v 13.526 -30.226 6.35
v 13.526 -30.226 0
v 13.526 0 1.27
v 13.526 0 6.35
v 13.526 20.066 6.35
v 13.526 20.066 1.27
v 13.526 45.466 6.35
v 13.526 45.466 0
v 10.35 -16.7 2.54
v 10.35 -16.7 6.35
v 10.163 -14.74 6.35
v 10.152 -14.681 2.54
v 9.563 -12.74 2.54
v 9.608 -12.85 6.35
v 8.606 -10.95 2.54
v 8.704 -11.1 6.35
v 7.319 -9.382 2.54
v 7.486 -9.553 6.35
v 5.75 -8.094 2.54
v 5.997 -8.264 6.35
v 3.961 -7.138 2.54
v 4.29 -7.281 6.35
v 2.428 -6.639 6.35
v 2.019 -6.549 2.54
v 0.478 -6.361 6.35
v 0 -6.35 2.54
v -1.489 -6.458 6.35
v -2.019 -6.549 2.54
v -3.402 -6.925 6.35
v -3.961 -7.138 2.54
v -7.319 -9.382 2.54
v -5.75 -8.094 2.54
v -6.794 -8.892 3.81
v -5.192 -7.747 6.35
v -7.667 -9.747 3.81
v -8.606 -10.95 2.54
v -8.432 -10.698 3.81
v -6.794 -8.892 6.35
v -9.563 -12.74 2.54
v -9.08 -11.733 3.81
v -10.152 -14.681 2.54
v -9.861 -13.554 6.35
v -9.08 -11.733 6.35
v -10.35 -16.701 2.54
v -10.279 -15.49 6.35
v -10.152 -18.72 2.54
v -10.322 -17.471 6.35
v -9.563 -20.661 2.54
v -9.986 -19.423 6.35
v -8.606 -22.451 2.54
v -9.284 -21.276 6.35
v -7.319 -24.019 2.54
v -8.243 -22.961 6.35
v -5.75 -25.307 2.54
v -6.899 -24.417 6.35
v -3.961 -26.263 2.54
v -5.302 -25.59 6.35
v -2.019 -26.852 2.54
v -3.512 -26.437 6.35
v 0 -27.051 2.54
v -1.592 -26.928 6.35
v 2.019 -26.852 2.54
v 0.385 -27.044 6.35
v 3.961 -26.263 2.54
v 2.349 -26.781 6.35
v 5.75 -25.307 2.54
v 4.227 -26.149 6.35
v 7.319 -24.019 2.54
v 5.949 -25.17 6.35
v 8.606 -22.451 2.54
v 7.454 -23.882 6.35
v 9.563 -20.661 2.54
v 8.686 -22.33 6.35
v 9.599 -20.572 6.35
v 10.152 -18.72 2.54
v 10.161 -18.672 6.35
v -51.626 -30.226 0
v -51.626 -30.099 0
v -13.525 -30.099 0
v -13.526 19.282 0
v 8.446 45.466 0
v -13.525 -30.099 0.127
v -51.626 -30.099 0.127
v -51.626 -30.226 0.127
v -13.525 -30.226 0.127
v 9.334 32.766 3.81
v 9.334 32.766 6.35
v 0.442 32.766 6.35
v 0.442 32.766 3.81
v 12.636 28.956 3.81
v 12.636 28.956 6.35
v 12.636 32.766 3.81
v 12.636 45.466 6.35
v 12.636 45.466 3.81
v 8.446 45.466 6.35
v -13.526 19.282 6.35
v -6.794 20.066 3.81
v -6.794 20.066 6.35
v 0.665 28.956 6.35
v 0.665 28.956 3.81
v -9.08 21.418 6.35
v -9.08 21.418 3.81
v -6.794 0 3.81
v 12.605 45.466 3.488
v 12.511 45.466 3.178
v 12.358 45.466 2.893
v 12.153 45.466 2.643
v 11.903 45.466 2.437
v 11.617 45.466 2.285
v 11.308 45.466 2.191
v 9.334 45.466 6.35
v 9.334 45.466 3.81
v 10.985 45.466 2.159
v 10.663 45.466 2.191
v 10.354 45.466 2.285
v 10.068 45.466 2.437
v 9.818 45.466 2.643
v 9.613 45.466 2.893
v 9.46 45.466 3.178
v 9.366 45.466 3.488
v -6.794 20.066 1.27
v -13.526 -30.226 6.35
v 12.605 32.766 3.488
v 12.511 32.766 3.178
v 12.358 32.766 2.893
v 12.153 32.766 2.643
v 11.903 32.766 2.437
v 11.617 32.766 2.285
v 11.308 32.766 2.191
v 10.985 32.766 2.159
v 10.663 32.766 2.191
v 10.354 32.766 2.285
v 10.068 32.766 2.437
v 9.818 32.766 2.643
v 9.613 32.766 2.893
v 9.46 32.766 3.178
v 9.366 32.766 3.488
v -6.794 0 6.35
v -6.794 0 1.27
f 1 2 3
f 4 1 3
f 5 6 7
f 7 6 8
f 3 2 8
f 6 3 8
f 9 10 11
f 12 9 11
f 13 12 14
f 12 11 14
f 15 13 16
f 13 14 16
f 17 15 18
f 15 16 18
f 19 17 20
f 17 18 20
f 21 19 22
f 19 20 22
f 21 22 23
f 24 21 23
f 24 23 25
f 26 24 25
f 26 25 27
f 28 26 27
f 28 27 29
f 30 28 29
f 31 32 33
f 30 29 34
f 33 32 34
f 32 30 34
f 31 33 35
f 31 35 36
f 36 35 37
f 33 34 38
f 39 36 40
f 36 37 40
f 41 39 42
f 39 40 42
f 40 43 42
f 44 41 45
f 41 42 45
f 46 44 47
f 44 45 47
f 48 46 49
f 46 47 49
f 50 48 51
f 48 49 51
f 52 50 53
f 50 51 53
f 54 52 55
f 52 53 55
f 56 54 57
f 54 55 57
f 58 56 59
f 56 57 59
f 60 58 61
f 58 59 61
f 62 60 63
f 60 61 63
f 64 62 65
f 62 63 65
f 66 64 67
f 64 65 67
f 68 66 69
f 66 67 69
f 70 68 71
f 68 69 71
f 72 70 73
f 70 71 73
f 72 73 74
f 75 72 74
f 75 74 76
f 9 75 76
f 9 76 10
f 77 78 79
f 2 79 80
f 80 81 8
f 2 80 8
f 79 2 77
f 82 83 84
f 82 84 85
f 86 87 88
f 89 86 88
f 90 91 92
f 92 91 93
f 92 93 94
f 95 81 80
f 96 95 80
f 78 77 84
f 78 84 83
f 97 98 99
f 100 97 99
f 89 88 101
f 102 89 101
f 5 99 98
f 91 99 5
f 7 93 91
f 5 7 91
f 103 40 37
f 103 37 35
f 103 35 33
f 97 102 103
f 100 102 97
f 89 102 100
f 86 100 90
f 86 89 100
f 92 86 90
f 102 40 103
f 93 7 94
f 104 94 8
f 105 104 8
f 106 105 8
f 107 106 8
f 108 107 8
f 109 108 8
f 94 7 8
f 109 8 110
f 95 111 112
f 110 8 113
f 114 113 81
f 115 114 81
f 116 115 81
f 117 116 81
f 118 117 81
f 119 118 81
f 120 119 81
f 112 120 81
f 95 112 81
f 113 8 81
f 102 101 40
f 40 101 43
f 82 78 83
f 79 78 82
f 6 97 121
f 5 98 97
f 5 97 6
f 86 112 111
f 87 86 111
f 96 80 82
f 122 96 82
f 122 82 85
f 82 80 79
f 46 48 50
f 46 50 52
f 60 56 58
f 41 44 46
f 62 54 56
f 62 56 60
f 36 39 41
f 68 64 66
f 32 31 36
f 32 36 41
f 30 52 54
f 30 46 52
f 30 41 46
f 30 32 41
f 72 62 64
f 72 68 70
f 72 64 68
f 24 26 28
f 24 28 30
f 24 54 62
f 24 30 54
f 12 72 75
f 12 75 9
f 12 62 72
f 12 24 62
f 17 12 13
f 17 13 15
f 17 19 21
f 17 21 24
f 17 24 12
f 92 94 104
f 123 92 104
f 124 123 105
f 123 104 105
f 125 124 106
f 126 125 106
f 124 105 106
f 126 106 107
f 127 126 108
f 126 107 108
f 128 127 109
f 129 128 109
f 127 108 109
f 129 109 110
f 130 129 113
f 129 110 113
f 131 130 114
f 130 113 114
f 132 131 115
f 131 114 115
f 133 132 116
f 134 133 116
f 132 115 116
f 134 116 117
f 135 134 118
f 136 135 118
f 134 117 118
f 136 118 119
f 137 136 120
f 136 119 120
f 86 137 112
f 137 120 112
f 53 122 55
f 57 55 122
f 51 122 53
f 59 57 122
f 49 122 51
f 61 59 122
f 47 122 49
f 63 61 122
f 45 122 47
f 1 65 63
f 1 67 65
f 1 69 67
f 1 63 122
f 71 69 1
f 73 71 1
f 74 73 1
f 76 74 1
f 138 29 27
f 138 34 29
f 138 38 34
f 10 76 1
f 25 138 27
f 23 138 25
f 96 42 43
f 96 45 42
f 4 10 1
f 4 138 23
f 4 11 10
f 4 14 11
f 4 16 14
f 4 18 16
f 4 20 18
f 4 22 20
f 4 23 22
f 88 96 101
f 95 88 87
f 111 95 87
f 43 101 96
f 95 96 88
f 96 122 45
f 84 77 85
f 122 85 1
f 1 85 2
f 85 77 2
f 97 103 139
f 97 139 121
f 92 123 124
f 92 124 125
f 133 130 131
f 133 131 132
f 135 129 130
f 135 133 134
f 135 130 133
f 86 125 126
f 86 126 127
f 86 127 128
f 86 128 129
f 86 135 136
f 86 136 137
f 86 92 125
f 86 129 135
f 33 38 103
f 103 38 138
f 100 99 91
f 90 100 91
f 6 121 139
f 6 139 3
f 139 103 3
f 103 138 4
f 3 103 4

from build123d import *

# Parameters (mm, degrees)
F1_DEPTH  = 6.35
F2_R      = 10.3505
F3_DEPTH  = 3.81
F4_W      = 20.32
F4_H      = 20.066
F5_DEPTH  = 5.08
F7_DEPTH  = 12.7
F9_DEPTH  = 2.54
F10_W     = 38.1
F10_H     = 0.127
F11_DEPTH = 0.127


with BuildPart() as f1:
    # F0 (on Top) → F1 (new body)
    with BuildSketch(Plane.XY):
        Polygon((8.4455, 45.466), (-13.5255, 19.281982), (-13.5255, -30.226), (13.5255, -30.226), (13.5255, 45.466), align=None)
    extrude(amount=F1_DEPTH)

    # F2 (on face) → F3 (cut)
    with BuildSketch(Plane.XY.offset(6.35)):
        with Locations((0, -16.7005)):
            Circle(F2_R)
    extrude(amount=-F3_DEPTH, mode=Mode.SUBTRACT)

    # F4 (on face) → F5 (cut)
    with BuildSketch(Plane.XY.offset(6.35)):
        with Locations((3.3655, 10.033)):
            Rectangle(F4_W, F4_H)
    extrude(amount=-F5_DEPTH, mode=Mode.SUBTRACT)

    # F6 (on face) → F7 (cut)
    with BuildSketch(Plane(origin=(0, 45.466, 0), x_dir=(-1, 0, 0), z_dir=(0, 1, 0))):
        with BuildLine():
            ThreePointArc((-12.6365, 3.81), (-10.9855, 2.159), (-9.3345, 3.81))
            ThreePointArc((-9.3345, 3.81), (-10.9855, 5.461), (-12.6365, 3.81))
        make_face()
        with BuildLine():
            ThreePointArc((-12.6365, 3.81), (-10.9855, 5.461), (-9.3345, 3.81))
            Line((-9.3345, 3.81), (-9.3345, 6.35))
            Line((-9.3345, 6.35), (-12.6365, 6.35))
            Line((-12.6365, 6.35), (-12.6365, 3.81))
        make_face()
    extrude(amount=-F7_DEPTH, mode=Mode.SUBTRACT)

    # F8 (on face) → F9 (cut)
    with BuildSketch(Plane.XY.offset(6.35)):
        with BuildLine():
            Line((12.6365, 28.956), (12.6365, 32.766))
            Line((12.6365, 32.766), (0.441522, 32.766))
            Line((0.441522, 32.766), (-9.0805, 21.418096))
            Line((-9.0805, 21.418096), (-9.0805, -11.732868))
            ThreePointArc((-9.0805, -11.732868), (-8.063565, -10.211142), (-6.7945, -8.892324))
            Line((-6.7945, -8.892324), (-6.7945, 0))
            Line((-6.7945, 0), (-6.7945, 20.066))
            Line((-6.7945, 20.066), (0.665096, 28.956))
            Line((0.665096, 28.956), (12.6365, 28.956))
        make_face()
    extrude(amount=-F9_DEPTH, mode=Mode.SUBTRACT)

    # F10 (on face) → F11 (join)
    with BuildSketch(Plane.XY):
        with Locations((-32.5755, -30.1625)):
            Rectangle(F10_W, F10_H)
    extrude(amount=F11_DEPTH)


solid = f1.part
